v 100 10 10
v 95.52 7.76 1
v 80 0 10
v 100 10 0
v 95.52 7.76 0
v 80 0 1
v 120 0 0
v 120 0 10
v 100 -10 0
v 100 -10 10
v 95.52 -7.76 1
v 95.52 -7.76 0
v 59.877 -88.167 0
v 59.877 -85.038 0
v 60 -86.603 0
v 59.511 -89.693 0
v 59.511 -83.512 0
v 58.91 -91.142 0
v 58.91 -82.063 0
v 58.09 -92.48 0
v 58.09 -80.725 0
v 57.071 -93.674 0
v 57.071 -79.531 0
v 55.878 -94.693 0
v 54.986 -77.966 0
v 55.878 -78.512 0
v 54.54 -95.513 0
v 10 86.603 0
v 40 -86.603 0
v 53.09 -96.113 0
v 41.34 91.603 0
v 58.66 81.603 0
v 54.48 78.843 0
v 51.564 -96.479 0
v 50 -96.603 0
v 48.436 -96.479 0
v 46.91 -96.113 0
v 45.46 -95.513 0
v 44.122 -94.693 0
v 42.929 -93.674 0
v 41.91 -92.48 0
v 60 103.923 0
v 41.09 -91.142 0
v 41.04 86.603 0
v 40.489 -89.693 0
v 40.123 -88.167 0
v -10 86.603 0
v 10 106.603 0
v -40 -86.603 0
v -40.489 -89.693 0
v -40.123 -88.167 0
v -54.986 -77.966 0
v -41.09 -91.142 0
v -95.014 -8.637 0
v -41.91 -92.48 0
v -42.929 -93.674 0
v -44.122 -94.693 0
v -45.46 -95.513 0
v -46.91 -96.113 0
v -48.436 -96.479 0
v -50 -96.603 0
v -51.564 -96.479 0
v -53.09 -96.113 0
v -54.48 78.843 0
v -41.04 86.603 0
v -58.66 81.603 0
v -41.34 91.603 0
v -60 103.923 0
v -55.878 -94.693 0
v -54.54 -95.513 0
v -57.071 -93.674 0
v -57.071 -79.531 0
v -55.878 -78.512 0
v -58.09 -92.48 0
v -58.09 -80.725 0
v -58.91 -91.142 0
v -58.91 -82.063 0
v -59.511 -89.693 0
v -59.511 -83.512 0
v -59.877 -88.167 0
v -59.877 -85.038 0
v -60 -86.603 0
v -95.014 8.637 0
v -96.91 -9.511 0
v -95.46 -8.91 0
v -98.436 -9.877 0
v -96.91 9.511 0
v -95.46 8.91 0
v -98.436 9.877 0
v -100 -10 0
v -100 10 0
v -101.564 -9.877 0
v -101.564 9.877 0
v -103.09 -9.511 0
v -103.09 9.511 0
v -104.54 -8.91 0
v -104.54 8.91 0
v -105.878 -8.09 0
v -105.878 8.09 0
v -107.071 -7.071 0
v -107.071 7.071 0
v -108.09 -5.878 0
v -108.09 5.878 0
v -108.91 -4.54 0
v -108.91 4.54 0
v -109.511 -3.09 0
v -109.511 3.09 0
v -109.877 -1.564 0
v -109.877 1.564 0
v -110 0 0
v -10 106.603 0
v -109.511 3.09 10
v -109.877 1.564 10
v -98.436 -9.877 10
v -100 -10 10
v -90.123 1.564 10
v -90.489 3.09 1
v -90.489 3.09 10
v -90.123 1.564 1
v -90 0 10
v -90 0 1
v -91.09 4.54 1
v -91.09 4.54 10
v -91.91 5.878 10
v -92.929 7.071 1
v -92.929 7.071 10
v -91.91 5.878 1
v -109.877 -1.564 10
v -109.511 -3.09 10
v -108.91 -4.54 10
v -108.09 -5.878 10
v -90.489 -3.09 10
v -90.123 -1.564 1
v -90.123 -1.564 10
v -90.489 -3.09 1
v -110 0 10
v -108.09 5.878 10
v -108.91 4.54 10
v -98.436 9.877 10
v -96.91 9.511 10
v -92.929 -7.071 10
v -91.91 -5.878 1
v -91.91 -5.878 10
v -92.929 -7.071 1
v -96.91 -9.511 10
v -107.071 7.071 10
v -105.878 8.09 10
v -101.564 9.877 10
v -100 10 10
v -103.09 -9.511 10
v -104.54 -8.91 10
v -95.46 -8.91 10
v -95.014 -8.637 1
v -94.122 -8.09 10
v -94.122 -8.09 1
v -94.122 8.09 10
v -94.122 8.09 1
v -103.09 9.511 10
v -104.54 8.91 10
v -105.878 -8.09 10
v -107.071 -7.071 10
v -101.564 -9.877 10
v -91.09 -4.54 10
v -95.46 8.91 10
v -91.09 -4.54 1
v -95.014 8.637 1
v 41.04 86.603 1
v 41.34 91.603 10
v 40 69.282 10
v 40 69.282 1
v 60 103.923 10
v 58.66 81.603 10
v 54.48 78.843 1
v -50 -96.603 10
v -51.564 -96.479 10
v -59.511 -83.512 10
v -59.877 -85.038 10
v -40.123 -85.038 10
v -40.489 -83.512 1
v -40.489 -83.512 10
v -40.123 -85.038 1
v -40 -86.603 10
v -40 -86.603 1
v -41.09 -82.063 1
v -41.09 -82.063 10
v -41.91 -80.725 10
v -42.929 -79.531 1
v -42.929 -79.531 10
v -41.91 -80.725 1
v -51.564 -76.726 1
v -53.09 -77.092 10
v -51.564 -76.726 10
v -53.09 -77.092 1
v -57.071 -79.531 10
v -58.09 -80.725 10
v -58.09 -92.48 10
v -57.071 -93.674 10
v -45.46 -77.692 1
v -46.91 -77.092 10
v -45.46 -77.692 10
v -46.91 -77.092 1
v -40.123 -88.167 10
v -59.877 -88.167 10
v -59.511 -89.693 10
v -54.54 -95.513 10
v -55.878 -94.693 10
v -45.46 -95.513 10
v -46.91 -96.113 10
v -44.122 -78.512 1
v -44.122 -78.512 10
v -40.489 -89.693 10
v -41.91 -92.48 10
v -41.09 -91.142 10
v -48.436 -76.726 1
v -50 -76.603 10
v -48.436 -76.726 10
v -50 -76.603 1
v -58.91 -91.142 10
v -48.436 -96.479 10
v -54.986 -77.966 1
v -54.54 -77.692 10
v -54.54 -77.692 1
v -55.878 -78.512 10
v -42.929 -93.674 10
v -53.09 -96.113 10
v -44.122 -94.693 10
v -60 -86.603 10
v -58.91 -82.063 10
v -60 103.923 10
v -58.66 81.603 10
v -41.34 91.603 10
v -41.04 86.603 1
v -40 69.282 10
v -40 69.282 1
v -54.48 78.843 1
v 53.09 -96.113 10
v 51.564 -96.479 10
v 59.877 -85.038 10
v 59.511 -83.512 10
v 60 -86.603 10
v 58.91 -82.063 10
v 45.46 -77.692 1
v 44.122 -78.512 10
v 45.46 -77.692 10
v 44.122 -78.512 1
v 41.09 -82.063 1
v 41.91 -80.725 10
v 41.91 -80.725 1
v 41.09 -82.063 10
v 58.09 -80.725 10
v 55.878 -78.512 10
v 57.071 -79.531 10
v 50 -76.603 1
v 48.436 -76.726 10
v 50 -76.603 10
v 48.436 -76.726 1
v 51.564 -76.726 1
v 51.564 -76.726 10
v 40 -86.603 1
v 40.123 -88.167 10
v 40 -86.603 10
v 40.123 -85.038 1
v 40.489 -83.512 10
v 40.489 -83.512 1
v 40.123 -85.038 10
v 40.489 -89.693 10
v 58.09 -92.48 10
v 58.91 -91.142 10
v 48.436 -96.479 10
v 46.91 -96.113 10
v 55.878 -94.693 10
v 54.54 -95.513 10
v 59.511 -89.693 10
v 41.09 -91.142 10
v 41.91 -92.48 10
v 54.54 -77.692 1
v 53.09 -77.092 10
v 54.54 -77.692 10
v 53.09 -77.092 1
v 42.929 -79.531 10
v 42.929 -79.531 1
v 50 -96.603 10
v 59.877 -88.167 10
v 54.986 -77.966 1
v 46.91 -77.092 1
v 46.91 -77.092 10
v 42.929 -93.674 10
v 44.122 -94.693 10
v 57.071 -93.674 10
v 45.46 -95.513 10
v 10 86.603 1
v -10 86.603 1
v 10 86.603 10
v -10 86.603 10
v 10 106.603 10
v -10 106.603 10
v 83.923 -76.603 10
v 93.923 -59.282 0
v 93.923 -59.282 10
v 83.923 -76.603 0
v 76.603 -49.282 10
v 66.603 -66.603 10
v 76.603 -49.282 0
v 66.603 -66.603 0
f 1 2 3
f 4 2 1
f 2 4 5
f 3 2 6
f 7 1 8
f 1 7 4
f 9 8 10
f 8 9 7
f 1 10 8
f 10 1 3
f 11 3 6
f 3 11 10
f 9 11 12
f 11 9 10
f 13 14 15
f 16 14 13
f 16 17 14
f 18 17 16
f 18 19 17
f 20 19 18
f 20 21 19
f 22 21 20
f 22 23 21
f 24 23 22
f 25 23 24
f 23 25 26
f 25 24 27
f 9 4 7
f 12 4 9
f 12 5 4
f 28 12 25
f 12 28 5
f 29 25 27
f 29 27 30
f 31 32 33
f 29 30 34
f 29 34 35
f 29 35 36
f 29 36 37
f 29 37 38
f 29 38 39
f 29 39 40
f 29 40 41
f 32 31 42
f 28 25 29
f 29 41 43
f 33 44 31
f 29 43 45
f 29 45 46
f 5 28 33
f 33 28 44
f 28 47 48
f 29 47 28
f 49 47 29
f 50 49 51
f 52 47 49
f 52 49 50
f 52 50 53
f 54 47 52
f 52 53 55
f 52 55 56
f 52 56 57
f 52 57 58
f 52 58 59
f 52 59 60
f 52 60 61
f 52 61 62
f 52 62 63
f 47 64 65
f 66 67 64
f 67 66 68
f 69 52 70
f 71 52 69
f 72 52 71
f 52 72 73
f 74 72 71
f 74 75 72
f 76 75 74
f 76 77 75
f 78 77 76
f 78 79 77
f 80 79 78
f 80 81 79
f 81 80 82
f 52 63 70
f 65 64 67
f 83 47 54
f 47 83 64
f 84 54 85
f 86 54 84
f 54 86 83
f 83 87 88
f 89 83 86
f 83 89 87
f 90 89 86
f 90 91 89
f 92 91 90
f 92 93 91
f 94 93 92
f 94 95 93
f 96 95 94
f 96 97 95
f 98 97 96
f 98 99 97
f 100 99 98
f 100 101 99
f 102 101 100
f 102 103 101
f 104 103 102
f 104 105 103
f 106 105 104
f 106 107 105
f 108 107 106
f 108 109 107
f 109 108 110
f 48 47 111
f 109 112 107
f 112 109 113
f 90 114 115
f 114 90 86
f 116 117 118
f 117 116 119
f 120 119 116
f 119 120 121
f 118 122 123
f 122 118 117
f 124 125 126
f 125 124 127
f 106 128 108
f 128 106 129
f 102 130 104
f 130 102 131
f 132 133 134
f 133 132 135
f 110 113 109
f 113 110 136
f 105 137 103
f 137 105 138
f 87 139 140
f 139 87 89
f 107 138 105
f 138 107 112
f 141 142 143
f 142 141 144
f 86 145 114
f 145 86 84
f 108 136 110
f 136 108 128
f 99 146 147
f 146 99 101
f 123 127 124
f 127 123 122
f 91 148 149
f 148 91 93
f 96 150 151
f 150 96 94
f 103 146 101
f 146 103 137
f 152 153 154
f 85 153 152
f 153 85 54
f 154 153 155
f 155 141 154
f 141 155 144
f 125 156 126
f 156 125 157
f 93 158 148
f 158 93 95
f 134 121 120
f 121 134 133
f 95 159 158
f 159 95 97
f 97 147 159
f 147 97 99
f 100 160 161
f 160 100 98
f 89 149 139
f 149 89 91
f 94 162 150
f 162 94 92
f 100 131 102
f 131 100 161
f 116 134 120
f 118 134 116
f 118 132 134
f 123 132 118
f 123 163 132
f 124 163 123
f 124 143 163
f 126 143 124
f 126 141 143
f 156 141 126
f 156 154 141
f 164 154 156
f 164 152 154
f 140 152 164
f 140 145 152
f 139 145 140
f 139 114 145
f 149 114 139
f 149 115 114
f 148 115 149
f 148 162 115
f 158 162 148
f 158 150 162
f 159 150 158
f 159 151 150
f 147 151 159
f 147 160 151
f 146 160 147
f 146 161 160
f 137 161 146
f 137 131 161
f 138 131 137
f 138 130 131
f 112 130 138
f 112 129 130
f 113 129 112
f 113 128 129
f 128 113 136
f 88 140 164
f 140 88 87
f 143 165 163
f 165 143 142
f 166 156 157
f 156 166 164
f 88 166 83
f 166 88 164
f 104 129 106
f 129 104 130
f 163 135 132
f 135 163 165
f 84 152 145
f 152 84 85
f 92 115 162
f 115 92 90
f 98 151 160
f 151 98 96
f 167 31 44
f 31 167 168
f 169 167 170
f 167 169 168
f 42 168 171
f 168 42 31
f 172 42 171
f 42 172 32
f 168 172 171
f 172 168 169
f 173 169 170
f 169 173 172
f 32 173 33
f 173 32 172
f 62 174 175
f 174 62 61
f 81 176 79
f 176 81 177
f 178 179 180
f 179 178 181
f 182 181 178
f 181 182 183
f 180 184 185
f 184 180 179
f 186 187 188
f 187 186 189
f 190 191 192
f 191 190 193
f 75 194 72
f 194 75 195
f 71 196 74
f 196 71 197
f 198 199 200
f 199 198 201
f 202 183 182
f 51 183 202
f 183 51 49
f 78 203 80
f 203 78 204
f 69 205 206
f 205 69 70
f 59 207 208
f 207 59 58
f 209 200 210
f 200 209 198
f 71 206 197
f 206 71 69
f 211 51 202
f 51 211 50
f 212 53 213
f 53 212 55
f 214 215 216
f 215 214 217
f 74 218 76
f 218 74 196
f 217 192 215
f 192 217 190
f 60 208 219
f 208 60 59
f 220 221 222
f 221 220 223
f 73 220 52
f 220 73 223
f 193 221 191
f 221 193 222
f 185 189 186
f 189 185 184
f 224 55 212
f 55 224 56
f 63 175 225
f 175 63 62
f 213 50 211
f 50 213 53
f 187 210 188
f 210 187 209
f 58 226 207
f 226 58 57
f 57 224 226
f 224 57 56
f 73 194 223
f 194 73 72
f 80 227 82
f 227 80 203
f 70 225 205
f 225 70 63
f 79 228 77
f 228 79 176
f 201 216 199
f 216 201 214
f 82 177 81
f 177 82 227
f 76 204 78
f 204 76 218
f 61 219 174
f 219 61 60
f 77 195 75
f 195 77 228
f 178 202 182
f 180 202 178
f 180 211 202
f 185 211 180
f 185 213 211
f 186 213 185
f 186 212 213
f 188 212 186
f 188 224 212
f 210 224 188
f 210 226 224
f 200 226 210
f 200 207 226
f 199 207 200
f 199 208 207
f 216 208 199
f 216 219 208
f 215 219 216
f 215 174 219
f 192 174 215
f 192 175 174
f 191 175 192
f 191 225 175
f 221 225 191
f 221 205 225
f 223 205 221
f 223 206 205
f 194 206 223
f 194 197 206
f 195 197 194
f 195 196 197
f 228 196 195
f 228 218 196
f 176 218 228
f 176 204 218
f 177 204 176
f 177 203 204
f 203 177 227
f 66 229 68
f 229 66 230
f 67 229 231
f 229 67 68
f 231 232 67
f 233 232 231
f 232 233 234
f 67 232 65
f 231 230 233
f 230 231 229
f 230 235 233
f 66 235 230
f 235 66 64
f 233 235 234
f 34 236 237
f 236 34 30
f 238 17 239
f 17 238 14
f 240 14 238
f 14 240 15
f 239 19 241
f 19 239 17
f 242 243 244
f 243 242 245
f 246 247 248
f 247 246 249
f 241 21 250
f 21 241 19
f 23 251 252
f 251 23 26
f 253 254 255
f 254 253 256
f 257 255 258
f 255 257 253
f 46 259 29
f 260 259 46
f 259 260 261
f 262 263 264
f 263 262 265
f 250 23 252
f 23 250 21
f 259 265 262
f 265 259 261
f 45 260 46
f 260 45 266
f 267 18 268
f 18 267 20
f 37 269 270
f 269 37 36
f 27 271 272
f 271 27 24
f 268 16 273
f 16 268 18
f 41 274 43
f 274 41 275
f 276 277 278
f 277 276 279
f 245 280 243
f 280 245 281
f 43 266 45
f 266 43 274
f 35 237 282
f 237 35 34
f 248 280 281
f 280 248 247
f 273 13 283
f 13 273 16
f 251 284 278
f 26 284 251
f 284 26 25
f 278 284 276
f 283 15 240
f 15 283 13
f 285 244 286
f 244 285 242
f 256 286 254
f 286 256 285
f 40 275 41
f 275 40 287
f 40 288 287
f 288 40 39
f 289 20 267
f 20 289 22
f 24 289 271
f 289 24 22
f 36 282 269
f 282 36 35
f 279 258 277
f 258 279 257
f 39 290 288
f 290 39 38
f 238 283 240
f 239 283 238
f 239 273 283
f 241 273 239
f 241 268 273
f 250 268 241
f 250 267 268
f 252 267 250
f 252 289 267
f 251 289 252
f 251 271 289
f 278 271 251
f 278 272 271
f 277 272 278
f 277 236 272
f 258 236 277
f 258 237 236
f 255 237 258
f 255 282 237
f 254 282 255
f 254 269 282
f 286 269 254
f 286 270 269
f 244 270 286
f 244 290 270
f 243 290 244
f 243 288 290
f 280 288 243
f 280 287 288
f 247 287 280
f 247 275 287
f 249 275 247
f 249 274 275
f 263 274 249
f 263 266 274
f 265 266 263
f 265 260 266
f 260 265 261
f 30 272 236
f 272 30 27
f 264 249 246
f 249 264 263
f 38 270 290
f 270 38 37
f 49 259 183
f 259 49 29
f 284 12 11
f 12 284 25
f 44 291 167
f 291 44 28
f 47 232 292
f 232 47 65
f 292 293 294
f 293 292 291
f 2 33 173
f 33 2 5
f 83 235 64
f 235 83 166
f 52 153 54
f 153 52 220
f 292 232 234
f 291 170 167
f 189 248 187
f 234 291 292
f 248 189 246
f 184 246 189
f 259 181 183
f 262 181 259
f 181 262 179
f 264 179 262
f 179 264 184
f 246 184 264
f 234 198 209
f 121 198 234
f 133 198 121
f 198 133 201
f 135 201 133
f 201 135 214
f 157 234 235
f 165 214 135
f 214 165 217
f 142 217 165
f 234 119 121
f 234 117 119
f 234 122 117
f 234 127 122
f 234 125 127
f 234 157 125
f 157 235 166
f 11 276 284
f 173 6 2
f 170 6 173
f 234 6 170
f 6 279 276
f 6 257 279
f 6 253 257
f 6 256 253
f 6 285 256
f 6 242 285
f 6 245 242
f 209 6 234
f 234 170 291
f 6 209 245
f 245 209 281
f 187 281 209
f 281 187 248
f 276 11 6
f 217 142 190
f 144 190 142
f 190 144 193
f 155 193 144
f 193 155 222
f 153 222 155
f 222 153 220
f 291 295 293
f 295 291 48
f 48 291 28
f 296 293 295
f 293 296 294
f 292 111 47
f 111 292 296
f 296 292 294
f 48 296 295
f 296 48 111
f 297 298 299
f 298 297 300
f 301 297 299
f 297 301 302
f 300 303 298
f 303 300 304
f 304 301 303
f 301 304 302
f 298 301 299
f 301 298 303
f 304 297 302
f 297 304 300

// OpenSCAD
rOutWalls=100;
rBastion = 10;
rTower = 10;
hBastion = 10;
hTower = 10;
hGates = 10;
wGates = 20;
dGates = 20;

cylinder(1,rOutWalls,rOutWalls,$fn=6);

//bastions/towers
for(angle = [0:60:120]){
	translate([cos(angle)*rOutWalls, sin(angle)*rOutWalls, 0])
		rotate([0,0,angle])
			scale([2,1,1])
				cylinder(hBastion,rBastion,rBastion,$fn=4);
	translate([cos(angle+180)*rOutWalls, sin(angle+180)*rOutWalls, 0])
		cylinder(hTower,rTower,rTower,$fn=rTower*4);
}//bastions/towers positions

//gates
translate([-wGates/2,cos(30)*rOutWalls])
	rotate([0,0,0])
		cube([wGates,dGates,hGates]);

translate([(-cos(150)*rOutWalls-wGates),(cos(150)*rOutWalls+wGates),0])
	rotate([0,0,-30])
		cube([wGates,dGates,hGates]);
